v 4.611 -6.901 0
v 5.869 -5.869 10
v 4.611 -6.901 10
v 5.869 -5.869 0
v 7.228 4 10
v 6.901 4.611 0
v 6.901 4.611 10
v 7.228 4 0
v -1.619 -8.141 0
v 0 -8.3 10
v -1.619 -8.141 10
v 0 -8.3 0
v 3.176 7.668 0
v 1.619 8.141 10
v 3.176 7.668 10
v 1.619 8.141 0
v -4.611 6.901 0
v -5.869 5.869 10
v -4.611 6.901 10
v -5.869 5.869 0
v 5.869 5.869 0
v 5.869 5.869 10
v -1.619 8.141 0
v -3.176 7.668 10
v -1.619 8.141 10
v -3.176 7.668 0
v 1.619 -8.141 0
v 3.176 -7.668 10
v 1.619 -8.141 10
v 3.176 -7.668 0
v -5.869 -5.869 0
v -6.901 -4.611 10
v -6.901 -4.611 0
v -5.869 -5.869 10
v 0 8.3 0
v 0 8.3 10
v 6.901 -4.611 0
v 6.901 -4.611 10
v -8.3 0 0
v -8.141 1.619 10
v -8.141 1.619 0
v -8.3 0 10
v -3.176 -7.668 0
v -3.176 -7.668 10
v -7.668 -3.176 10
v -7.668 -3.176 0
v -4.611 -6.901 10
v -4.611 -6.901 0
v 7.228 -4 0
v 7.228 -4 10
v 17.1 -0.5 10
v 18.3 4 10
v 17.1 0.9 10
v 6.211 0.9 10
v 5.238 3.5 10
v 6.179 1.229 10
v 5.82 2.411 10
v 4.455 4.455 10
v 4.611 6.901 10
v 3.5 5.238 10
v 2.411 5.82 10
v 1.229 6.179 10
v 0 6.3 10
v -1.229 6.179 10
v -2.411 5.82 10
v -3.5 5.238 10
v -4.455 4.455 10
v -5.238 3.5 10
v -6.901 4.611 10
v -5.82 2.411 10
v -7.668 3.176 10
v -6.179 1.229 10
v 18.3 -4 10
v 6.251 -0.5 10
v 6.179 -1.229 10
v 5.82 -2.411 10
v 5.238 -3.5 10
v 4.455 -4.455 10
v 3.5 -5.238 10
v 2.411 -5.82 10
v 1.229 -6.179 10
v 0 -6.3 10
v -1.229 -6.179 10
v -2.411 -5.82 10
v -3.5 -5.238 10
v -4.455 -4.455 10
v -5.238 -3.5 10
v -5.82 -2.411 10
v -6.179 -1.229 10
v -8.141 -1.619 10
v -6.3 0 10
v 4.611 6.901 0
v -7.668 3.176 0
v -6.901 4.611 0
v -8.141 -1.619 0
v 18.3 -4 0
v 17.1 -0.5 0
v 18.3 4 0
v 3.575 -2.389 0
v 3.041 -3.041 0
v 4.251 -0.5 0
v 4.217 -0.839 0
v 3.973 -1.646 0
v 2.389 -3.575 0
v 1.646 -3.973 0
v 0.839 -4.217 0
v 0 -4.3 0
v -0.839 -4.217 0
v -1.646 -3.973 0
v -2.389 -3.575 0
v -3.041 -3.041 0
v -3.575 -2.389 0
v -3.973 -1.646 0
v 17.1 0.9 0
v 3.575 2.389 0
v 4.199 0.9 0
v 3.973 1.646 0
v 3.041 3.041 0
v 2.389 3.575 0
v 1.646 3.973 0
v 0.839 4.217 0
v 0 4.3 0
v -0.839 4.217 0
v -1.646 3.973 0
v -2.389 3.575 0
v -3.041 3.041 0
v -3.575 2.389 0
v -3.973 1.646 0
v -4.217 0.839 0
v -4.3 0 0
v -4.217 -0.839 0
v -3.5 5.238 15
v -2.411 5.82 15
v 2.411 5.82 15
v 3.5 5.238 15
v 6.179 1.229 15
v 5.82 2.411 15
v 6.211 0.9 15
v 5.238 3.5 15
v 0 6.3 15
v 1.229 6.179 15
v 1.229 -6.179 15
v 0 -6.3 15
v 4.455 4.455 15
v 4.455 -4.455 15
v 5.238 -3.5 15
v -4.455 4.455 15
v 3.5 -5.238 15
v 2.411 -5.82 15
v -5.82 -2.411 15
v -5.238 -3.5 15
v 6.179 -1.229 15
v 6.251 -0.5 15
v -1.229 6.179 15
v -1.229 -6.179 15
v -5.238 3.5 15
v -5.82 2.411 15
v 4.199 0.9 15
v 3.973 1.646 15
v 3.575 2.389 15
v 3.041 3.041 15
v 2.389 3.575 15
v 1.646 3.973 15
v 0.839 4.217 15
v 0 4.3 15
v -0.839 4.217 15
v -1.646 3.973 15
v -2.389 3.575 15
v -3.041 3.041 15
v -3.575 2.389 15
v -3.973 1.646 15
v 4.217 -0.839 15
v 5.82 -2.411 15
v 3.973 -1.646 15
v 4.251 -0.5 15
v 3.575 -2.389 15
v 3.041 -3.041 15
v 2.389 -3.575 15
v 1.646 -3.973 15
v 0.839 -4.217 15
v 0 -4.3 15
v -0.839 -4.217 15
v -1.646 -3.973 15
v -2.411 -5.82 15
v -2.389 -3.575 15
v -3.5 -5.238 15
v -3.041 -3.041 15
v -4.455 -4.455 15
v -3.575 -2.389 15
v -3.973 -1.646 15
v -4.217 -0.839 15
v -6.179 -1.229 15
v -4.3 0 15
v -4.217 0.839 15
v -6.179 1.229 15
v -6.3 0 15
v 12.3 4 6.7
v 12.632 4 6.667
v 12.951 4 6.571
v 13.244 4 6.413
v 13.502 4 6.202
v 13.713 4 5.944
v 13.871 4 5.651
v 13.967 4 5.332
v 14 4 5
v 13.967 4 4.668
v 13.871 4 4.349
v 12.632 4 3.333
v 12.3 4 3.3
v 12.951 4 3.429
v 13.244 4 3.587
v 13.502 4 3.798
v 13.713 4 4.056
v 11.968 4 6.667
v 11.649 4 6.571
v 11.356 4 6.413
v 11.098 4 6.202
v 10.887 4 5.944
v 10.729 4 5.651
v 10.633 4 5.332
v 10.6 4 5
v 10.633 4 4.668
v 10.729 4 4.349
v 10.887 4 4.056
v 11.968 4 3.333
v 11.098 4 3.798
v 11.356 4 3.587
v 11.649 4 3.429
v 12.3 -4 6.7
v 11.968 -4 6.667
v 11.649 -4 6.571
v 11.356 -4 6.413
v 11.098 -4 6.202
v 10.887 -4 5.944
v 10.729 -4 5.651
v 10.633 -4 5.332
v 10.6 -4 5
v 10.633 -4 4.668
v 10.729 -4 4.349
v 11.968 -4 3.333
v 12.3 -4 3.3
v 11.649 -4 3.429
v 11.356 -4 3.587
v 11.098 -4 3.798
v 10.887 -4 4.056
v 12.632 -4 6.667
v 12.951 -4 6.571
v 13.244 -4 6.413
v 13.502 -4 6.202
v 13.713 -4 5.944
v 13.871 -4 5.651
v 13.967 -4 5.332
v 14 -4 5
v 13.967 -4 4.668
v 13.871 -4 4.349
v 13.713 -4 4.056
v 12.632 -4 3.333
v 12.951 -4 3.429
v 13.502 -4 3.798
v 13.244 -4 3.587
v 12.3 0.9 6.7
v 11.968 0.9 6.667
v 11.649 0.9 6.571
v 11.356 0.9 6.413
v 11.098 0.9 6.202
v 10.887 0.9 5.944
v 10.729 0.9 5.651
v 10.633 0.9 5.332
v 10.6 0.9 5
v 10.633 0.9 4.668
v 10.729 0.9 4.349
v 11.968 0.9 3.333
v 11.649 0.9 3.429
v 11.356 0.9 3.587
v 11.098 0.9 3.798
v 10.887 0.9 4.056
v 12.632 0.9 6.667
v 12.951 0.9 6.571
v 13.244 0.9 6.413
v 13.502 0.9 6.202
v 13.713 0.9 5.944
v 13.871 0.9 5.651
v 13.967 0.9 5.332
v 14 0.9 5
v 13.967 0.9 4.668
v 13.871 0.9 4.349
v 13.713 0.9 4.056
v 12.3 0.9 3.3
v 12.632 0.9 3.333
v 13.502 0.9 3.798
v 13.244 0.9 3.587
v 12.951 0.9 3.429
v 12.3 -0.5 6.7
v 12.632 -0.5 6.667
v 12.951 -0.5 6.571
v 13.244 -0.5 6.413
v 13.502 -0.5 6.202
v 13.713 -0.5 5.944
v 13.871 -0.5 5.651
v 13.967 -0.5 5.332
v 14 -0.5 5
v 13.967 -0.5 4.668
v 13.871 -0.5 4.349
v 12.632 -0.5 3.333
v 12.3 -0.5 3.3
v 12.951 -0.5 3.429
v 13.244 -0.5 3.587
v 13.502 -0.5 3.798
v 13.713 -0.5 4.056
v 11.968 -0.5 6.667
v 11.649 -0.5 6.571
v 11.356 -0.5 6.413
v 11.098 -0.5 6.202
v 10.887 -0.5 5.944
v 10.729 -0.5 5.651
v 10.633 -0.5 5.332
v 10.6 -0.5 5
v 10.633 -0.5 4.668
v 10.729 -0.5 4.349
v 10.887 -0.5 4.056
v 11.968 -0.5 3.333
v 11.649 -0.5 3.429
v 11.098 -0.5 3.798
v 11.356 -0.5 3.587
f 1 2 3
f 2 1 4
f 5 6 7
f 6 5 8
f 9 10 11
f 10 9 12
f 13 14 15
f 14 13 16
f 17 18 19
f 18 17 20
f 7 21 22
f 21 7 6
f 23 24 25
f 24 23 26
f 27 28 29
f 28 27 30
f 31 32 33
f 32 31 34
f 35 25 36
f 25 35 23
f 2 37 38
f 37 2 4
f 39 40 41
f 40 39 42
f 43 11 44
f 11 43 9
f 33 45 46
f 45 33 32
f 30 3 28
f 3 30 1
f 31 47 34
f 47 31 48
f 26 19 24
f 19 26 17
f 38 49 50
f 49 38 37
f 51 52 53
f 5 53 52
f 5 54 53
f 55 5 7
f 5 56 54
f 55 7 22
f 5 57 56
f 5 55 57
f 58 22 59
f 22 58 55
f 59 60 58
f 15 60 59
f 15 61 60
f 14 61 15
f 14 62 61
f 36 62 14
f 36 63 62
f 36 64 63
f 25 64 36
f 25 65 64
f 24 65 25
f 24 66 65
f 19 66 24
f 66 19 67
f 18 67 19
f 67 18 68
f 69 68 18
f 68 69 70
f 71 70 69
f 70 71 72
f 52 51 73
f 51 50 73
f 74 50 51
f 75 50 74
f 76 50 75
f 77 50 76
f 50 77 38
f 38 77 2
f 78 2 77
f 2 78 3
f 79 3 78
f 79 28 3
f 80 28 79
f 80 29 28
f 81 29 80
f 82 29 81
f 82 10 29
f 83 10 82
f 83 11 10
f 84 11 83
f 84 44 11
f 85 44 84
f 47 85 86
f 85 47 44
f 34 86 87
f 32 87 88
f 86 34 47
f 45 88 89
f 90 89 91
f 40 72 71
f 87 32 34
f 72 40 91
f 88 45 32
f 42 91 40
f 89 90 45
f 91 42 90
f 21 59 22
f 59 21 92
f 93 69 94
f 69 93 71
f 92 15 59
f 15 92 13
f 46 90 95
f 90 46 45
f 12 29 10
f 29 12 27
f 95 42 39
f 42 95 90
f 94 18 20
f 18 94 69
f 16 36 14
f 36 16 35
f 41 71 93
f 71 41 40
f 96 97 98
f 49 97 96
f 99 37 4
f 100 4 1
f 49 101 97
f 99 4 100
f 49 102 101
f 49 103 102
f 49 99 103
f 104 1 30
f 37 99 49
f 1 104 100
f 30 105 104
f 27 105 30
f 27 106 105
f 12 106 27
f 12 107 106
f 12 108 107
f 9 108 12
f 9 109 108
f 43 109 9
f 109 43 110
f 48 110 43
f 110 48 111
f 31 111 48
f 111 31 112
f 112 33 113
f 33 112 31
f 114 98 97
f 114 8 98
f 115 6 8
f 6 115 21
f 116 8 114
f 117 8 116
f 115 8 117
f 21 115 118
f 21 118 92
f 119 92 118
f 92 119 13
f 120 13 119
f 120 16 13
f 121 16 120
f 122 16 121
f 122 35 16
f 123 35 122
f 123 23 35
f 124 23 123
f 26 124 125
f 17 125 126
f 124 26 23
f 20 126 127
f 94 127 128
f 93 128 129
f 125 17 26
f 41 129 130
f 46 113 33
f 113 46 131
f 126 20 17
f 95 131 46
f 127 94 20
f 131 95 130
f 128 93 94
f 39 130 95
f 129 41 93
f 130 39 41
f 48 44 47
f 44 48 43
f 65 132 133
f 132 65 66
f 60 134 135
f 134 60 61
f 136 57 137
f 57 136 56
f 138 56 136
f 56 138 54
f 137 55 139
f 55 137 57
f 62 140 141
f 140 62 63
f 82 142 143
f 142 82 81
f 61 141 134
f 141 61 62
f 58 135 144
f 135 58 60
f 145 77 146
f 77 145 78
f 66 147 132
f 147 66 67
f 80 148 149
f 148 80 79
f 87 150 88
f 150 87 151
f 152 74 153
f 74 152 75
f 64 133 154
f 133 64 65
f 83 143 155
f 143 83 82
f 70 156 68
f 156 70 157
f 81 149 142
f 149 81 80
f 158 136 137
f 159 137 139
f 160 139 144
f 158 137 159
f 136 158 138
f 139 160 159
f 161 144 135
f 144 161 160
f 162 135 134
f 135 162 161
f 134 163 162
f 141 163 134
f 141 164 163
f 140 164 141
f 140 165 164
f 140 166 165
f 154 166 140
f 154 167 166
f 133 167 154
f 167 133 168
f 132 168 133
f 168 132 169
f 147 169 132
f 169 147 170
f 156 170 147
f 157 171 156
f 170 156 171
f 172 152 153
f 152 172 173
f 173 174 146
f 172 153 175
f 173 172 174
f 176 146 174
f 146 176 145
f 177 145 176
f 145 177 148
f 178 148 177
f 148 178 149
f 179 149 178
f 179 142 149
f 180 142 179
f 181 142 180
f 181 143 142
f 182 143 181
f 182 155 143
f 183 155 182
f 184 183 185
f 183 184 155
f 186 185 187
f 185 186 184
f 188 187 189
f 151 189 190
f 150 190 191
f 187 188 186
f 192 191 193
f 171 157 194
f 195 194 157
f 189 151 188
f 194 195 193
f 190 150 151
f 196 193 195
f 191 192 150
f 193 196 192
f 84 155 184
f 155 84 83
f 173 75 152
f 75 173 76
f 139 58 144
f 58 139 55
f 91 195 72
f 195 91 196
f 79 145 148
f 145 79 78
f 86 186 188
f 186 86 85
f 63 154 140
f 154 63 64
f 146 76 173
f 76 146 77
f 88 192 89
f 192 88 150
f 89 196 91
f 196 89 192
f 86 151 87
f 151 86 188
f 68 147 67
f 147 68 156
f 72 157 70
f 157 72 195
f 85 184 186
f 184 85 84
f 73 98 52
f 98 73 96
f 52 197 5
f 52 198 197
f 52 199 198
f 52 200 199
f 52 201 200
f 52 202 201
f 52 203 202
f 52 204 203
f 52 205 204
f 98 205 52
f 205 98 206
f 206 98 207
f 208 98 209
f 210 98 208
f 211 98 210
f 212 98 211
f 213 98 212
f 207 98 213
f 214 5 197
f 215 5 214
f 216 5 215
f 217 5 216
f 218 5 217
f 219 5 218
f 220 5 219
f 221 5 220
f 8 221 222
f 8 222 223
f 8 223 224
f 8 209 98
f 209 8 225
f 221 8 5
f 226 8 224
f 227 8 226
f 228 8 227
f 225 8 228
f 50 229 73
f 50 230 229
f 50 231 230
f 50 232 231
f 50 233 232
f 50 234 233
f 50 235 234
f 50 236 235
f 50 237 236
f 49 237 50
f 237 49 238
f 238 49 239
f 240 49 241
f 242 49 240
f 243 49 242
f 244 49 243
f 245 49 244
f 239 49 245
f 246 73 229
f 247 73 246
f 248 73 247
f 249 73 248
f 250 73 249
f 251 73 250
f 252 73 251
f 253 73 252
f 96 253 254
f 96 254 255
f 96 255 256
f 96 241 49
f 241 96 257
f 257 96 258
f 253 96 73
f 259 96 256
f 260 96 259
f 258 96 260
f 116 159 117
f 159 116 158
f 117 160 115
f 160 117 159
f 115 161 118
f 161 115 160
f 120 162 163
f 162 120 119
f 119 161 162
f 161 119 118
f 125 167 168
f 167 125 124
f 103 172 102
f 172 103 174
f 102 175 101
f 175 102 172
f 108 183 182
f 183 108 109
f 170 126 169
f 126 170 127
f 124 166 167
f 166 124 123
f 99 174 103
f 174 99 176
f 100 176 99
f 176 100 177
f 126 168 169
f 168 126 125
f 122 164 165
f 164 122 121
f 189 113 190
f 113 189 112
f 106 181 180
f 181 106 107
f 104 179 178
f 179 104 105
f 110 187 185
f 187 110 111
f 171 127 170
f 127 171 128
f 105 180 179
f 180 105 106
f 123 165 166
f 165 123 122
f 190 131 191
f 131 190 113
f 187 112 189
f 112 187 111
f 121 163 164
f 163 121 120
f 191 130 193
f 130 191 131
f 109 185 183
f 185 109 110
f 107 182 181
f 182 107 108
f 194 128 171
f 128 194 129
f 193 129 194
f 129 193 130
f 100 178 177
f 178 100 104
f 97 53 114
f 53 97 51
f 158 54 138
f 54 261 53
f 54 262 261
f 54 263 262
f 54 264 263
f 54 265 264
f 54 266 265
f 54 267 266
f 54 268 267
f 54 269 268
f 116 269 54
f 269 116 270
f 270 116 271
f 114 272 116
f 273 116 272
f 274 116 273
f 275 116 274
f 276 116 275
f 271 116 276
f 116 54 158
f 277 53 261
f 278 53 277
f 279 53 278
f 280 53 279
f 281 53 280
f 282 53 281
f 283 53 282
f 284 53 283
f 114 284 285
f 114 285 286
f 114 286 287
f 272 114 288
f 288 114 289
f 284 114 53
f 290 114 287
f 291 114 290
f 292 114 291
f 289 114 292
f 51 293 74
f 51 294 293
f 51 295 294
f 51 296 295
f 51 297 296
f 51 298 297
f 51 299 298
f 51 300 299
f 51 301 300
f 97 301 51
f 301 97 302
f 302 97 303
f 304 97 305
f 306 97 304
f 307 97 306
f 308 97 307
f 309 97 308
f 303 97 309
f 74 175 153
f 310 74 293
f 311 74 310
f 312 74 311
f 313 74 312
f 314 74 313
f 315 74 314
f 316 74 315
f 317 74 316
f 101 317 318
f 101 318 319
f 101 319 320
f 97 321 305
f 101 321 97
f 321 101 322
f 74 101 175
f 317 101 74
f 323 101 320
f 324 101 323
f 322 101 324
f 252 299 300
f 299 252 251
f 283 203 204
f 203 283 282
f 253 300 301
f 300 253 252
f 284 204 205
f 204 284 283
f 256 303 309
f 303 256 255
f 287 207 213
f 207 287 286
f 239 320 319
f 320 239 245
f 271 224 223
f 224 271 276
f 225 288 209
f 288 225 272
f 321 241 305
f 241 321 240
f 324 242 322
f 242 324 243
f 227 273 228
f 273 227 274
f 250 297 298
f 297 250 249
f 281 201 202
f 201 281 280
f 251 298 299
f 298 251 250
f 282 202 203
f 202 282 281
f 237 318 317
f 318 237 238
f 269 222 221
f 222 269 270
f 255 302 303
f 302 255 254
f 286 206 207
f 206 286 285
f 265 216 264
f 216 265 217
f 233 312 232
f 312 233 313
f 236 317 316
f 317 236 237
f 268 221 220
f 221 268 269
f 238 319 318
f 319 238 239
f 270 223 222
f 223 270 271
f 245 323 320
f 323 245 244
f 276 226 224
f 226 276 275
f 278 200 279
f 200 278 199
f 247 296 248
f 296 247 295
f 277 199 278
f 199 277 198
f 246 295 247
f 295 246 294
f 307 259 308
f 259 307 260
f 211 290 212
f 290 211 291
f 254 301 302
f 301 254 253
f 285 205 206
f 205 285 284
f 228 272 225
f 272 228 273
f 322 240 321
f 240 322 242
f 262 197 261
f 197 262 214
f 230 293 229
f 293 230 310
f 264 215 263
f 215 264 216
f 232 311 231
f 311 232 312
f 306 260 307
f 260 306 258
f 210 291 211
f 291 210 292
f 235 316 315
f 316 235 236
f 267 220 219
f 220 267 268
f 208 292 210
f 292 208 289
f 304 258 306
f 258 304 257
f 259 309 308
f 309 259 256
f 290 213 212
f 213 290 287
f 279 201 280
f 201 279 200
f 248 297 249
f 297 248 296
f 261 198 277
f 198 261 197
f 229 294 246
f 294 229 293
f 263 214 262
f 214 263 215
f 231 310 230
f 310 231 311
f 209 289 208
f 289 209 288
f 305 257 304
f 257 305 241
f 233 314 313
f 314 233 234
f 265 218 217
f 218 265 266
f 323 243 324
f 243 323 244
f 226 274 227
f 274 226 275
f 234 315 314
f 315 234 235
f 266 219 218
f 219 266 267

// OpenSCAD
$fn = 32;
d_1 = 8.0; // axis diameter

r_1 = d_1 / 2 + 0.3; // minus, as
r_2 = r_1 + 4.0;      // external bottom
r_3 = r_1 + 2.0;      // external bottom

h_1 = 10.0;
h_2 = 15.0;

difference() {
  union() {
    cylinder( r=r_2, h=h_1 );
    cylinder( r=r_3, h=h_2 );
    translate( [r_1,-4.0,0.0] ) cube( [14.0,8.0,h_1] );
  }
  cylinder( r=r_1, h=h_2 );
  translate( [r_1-1,-0.5,0.0] ) cube( [13.8,1.4,h_2] );
  translate([r_2+4.0,5.0,5.0]) rotate([90,0,0]) cylinder( r=1.7, h=10 );
}
